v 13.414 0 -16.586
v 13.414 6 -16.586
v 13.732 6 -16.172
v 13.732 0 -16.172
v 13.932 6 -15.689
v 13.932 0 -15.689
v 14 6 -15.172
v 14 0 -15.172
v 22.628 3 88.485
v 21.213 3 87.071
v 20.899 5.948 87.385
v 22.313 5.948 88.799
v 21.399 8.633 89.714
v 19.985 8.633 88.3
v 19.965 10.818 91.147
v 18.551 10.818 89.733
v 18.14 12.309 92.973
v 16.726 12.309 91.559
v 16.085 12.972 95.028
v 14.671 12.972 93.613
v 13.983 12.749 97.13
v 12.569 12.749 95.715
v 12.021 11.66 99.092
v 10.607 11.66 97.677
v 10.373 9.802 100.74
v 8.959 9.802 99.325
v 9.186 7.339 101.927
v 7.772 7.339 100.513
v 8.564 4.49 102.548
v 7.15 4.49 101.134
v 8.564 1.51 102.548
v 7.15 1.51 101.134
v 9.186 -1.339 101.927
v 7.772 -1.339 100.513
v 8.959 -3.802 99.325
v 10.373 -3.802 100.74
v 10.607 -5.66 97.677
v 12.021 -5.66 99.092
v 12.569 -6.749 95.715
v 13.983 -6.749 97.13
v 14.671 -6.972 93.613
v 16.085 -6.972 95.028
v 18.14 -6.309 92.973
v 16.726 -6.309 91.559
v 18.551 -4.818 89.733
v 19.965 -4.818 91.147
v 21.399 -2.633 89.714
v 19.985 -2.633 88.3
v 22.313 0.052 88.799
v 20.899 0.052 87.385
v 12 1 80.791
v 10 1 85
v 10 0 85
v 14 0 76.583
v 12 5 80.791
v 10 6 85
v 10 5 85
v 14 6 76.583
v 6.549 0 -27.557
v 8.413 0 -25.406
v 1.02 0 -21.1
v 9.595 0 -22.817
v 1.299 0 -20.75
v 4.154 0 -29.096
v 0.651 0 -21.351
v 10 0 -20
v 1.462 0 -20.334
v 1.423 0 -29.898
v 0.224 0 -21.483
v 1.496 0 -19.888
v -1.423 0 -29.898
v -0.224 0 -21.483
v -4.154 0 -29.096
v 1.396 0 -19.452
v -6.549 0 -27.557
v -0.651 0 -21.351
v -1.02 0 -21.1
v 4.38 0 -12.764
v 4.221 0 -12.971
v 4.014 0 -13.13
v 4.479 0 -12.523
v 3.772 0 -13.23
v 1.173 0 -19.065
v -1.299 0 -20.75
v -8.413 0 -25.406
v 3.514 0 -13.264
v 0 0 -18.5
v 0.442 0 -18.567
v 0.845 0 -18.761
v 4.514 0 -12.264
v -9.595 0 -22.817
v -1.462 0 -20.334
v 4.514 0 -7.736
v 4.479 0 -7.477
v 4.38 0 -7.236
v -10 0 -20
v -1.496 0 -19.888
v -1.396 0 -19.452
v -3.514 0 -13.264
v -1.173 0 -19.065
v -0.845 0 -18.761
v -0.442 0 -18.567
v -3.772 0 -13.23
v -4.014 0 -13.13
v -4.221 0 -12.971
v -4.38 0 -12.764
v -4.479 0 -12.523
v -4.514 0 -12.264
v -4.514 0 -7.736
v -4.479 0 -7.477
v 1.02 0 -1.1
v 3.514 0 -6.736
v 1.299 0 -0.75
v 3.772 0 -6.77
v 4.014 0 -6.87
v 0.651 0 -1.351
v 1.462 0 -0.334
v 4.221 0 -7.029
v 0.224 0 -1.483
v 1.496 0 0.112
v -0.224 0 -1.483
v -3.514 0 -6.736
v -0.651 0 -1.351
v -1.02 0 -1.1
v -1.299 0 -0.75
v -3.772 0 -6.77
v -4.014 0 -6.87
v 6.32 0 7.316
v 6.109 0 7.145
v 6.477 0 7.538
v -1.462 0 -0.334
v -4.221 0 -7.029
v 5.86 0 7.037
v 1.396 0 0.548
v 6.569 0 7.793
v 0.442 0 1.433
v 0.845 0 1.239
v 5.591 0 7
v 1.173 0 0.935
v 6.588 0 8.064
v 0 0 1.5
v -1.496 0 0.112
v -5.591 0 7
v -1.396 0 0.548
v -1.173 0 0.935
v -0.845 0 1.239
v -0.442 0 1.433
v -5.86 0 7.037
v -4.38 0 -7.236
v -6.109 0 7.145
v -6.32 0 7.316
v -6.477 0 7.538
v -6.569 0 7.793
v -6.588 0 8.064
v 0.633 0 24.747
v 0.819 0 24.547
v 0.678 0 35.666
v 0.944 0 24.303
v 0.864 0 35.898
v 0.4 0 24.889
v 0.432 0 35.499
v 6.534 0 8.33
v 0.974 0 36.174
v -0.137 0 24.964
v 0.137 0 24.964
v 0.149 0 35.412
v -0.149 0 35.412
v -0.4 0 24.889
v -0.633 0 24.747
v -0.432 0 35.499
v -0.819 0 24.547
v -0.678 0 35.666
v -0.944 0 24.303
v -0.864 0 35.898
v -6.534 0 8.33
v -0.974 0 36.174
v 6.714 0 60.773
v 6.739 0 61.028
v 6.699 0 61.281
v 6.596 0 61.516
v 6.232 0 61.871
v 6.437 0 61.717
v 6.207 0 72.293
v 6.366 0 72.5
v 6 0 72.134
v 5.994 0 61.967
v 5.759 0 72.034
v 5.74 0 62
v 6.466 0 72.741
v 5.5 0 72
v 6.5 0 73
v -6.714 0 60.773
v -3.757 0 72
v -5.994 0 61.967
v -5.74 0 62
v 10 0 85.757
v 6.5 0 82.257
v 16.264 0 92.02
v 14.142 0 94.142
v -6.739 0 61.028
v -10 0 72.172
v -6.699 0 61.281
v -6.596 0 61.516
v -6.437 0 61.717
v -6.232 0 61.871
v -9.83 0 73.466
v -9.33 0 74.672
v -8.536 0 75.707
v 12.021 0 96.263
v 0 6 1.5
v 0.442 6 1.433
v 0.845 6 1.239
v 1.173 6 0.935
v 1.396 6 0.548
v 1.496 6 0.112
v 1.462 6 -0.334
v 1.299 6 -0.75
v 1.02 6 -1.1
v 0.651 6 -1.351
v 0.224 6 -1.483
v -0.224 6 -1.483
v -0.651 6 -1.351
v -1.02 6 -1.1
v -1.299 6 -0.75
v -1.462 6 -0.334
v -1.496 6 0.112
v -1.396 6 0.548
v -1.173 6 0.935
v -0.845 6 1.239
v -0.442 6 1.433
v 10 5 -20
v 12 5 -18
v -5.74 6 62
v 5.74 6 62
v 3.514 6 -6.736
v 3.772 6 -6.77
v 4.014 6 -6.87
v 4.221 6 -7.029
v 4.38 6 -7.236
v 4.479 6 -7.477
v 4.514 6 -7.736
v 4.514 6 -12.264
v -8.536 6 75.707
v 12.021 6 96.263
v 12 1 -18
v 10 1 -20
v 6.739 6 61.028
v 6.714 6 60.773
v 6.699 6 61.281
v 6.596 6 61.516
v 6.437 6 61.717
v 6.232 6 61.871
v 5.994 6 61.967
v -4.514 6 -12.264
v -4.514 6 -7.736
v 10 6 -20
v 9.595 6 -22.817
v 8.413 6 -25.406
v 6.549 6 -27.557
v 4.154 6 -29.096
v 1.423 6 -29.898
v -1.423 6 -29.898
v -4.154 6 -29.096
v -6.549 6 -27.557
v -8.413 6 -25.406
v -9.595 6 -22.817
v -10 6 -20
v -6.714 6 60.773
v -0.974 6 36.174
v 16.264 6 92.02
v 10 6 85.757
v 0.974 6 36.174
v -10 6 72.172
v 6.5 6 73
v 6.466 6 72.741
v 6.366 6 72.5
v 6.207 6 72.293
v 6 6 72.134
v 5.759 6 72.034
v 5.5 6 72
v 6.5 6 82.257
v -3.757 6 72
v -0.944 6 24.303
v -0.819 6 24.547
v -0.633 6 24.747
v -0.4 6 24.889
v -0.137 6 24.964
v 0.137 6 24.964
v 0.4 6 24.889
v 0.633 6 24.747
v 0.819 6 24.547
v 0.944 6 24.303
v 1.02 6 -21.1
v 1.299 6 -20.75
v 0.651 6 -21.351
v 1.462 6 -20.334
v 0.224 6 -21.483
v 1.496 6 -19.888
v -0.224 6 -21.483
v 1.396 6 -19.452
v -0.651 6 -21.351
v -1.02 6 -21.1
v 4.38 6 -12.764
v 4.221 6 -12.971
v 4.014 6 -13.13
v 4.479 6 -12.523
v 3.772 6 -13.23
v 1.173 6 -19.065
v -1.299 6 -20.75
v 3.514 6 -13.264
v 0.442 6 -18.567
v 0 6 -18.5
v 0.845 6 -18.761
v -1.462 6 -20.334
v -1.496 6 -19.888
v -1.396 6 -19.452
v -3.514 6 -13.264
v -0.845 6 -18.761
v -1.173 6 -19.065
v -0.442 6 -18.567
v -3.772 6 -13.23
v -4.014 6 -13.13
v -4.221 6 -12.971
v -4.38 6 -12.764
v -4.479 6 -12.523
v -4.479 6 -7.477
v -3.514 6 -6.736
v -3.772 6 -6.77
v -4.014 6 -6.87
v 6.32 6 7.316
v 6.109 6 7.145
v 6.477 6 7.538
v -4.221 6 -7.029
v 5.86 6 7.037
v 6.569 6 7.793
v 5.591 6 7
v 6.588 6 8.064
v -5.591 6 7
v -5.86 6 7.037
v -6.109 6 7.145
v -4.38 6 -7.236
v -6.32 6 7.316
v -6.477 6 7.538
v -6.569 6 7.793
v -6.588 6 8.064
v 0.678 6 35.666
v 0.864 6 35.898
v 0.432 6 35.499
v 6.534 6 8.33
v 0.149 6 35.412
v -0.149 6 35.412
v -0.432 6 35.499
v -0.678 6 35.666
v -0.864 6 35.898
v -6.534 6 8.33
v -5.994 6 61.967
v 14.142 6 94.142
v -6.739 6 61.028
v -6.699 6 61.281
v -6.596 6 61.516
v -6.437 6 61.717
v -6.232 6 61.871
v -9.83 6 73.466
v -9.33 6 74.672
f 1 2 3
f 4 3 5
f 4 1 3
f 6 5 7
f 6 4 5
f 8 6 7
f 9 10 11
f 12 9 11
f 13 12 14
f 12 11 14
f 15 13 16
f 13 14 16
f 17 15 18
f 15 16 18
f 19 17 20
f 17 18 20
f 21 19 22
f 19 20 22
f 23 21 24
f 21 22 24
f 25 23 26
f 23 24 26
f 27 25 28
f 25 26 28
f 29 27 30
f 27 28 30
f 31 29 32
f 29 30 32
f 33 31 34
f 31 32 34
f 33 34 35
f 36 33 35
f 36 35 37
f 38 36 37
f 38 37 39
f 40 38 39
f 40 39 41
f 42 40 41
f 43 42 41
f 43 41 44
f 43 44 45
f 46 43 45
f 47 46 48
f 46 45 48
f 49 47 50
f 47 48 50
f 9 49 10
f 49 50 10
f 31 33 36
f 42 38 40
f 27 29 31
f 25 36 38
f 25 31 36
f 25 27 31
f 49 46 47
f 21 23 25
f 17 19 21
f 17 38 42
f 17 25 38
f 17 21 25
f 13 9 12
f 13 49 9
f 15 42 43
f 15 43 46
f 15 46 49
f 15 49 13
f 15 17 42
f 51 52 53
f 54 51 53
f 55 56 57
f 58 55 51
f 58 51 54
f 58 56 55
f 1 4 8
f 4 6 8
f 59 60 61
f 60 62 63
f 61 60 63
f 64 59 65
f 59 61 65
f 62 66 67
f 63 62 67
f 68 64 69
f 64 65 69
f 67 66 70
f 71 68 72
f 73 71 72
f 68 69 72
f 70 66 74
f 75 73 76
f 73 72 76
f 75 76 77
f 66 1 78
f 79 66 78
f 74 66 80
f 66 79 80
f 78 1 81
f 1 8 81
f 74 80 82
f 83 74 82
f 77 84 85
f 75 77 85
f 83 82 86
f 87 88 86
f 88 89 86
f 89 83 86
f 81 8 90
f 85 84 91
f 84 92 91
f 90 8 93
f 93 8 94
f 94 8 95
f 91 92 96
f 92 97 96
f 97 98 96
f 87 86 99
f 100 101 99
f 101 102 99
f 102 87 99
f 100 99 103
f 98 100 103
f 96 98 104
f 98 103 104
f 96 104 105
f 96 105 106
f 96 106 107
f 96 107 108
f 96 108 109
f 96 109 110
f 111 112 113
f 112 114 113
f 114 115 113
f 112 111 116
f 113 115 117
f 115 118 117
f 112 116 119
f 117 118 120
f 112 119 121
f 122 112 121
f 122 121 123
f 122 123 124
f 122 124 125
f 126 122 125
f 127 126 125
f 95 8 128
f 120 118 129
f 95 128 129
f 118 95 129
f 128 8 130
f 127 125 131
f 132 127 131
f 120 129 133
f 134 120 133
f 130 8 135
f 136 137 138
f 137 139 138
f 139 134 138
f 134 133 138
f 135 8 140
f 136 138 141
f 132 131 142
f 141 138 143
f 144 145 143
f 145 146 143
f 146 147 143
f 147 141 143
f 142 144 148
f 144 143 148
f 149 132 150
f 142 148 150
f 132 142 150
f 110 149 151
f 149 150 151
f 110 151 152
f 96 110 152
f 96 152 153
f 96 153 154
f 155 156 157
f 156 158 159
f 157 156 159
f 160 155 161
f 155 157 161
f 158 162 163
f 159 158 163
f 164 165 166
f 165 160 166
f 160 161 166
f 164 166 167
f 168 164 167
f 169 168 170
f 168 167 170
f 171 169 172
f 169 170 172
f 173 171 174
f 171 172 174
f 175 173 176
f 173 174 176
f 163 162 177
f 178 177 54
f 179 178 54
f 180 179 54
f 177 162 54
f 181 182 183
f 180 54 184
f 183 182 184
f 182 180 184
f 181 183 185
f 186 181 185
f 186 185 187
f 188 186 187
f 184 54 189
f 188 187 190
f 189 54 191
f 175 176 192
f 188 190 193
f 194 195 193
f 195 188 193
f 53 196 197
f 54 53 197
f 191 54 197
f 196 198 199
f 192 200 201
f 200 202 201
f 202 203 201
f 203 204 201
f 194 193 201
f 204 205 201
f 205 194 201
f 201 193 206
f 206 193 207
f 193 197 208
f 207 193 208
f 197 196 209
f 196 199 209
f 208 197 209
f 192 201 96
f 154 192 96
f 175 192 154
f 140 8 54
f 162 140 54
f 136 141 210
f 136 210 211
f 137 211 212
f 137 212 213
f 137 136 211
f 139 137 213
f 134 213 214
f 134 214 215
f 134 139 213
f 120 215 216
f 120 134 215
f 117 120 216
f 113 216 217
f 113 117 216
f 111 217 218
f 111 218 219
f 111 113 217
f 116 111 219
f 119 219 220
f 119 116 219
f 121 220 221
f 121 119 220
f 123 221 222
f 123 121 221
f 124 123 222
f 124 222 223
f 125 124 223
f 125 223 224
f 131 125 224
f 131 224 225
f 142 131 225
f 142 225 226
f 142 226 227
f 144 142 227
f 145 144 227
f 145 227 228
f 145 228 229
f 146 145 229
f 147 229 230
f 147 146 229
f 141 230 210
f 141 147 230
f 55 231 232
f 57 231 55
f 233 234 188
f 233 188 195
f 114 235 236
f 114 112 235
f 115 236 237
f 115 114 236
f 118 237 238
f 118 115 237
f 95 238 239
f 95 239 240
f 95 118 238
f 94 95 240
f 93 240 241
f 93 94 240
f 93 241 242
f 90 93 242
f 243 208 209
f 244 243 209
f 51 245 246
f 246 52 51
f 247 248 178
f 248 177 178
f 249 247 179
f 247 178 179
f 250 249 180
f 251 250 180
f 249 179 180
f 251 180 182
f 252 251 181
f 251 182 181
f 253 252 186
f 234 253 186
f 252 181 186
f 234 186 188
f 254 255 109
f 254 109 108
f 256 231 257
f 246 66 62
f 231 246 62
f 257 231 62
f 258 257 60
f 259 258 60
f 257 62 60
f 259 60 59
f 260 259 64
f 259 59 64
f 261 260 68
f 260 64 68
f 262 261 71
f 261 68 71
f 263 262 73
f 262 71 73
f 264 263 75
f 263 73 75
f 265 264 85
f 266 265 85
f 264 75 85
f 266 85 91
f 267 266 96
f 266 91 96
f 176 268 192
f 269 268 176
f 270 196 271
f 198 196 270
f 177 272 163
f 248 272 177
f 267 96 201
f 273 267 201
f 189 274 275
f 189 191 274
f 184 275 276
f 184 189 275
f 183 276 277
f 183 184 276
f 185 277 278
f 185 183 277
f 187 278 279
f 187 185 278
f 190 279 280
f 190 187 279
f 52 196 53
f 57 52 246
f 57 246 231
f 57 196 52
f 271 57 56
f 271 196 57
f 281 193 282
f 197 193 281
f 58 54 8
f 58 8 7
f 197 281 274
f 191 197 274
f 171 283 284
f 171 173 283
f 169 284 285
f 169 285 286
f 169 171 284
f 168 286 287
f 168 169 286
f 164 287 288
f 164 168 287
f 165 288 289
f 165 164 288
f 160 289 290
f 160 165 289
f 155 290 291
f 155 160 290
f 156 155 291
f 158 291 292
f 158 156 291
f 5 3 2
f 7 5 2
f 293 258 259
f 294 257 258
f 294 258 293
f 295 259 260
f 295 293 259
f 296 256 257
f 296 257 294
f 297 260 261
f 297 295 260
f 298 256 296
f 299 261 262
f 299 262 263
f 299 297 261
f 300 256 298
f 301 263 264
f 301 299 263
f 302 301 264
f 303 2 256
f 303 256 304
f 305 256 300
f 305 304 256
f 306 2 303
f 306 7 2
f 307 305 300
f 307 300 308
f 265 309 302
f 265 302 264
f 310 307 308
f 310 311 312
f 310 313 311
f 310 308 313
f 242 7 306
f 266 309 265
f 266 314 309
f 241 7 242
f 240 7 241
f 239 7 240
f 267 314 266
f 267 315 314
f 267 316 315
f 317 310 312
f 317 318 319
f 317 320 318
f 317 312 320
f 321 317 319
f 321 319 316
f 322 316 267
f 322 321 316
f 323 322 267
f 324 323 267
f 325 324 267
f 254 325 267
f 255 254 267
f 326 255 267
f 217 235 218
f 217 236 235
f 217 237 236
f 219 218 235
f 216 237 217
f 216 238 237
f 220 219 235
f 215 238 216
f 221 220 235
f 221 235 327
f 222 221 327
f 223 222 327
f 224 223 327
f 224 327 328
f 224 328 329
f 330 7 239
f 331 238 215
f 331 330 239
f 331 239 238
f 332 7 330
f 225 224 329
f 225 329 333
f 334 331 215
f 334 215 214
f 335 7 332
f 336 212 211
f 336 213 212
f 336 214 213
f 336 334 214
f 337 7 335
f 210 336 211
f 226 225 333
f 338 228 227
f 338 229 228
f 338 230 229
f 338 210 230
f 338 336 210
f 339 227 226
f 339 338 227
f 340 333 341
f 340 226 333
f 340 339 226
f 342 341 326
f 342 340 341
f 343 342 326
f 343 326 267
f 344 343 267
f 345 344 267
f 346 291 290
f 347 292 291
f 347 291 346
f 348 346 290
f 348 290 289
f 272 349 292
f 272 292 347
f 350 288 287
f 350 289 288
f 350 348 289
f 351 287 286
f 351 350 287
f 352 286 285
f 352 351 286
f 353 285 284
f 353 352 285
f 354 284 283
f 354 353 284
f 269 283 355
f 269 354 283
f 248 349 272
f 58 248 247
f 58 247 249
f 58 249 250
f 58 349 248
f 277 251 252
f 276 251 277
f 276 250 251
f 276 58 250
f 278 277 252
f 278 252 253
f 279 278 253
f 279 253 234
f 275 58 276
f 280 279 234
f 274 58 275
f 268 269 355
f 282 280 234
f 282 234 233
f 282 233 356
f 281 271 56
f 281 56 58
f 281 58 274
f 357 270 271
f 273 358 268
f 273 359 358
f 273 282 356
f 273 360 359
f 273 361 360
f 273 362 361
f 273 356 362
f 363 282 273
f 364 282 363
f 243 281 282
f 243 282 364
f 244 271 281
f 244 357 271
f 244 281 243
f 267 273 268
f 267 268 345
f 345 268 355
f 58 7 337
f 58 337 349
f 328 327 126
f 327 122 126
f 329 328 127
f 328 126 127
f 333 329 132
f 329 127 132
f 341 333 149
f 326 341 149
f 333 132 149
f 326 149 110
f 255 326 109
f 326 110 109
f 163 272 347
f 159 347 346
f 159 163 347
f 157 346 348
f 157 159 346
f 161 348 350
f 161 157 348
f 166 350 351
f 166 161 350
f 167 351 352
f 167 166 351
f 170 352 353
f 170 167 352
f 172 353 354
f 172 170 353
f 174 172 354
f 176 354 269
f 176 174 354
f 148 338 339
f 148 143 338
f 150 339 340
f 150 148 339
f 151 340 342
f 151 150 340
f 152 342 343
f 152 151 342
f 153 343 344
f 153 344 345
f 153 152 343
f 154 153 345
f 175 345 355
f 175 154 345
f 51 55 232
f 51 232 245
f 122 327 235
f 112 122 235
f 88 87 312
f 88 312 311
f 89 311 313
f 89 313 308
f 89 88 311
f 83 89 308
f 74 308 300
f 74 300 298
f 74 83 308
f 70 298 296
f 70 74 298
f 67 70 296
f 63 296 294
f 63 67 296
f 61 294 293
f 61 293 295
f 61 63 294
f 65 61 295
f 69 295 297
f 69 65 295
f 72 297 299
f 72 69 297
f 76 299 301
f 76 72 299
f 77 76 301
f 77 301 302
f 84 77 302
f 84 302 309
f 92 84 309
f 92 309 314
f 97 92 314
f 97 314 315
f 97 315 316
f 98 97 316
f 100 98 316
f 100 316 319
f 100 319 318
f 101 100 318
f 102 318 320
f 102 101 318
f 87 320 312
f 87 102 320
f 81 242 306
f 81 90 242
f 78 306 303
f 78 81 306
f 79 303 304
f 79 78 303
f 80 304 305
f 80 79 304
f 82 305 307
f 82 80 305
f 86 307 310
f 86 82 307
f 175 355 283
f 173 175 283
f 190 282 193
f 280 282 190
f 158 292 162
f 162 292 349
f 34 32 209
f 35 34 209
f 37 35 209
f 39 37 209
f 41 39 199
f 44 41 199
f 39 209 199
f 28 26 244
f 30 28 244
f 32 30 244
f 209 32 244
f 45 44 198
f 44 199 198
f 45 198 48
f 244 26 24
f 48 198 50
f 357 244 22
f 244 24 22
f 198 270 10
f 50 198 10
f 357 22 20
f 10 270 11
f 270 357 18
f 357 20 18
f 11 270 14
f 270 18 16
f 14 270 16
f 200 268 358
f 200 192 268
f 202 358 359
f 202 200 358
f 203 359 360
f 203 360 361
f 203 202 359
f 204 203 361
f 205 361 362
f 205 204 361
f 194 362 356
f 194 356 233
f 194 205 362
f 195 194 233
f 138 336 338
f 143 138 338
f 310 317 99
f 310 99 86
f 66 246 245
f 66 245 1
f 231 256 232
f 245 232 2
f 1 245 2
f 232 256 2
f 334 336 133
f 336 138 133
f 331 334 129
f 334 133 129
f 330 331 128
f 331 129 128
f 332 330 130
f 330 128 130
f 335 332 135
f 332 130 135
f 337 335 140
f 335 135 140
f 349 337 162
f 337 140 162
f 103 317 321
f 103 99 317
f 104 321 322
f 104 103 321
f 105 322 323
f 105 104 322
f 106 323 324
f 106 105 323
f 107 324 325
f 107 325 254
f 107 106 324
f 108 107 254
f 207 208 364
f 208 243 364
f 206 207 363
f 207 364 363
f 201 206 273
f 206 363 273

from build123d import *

# Parameters (mm, degrees)
SKETCH1_R               = 1.5
BOSS_EXTRUDE1_DEPTH     = 6
SKETCH3_W               = 13
SKETCH3_H               = 23
SKETCH3_W_2             = 9.027129354
SKETCH3_H_2             = 6.528275522
CUT_EXTRUDE1_DEPTH      = 14
FILLET1_R               = 1
BOSS_EXTRUDE4_DEPTH     = 120
SKETCH7_W               = 4
SKETCH7_H               = 6
CUT_EXTRUDE5_DEPTH      = 15
SKETCH8_R               = 10
BOSS_EXTRUDE5_DEPTH     = 2
CUT_EXTRUDE6_DEPTH      = 18
FILLET4_R               = 2
FILLET5_R               = 5
CUT_EXTRUDE8_DEPTH      = 20
CUT_EXTRUDE8_DEPTH_BACK = 20
CUT_EXTRUDE9_DEPTH      = 20
CUT_EXTRUDE9_DEPTH_BACK = 20
BOSS_EXTRUDE9_DEPTH     = 6
SKETCH16_R              = 10
BOSS_EXTRUDE10_DEPTH    = 2
FILLET6_R               = 5


with BuildPart() as part:
    # Sketch1 → Boss-Extrude1 (new body)
    with BuildSketch(Plane(origin=(0, 0, 0), x_dir=(1, 0, 0), z_dir=(0, 1, 0))):
        with BuildLine():
            Line((-10, 20), (-10, -100))
            Line((-10, -100), (10, -100))
            Line((10, -100), (10, 20))
            ThreePointArc((10, 20), (0, 30), (-10, 20))
        make_face()
        with Locations(Location((0, 0, 0), (0, 0, 270))):
            Circle(SKETCH1_R, mode=Mode.SUBTRACT)
        with Locations(Location((0, 20, 0), (0, 0, 270))):
            Circle(SKETCH1_R, mode=Mode.SUBTRACT)
    extrude(amount=BOSS_EXTRUDE1_DEPTH)

    # Sketch3 → Cut-Extrude1 (cut)
    with BuildSketch(Plane(origin=(0, 6, 0), x_dir=(1, 0, 0), z_dir=(0, 1, 0))):
        Polygon((7, -7), (-7, -7), (0, -27), align=None)
        Polygon((7, -62), (-7, -62), (0, -32), align=None)
        with Locations((0, -83.5)):
            Rectangle(SKETCH3_W, SKETCH3_H)
        with Locations((0, 10)):
            Rectangle(SKETCH3_W_2, SKETCH3_H_2)
    extrude(amount=-CUT_EXTRUDE1_DEPTH, mode=Mode.SUBTRACT)

    # Fillet1
    fillet1_edges = [part.edges().sort_by_distance(p)[0] for p in [
        (-6.5, 3, 95),
        (-6.5, 3, 72),
        (6.5, 3, 72),
        (6.5, 3, 95),
        (0, 3, 32),
        (7, 3, 62),
        (-7, 3, 62),
        (-7, 3, 7),
        (7, 3, 7),
        (0, 3, 27),
        (-4.513564677, 3, -13.264137761),
        (4.513564677, 3, -13.264137761),
        (4.513564677, 3, -6.735862239),
        (-4.513564677, 3, -6.735862239),
    ]]
    fillet(fillet1_edges, radius=FILLET1_R)

    # Sketch6 → Boss-Extrude4 (add)
    with BuildSketch(Plane.XY.offset(100)):
        Polygon((14, 6), (10, 6), (10, 5), (12, 5), (12, 1), (10, 1), (10, 0), (14, 0), align=None)
    extrude(amount=-BOSS_EXTRUDE4_DEPTH)

    # Sketch7 → Cut-Extrude5 (cut)
    with BuildSketch(Plane.XY.offset(100)):
        with Locations((12, 3)):
            Rectangle(SKETCH7_W, SKETCH7_H)
    extrude(amount=-CUT_EXTRUDE5_DEPTH, mode=Mode.SUBTRACT)

    # Sketch8 → Boss-Extrude5 (add)
    with BuildSketch(Plane.XY.offset(100)):
        with Locations((0, 3)):
            Circle(SKETCH8_R)
    extrude(amount=BOSS_EXTRUDE5_DEPTH)

    # Sketch9 → Cut-Extrude6 (cut)
    with BuildSketch(Plane(origin=(0, 6, 0), x_dir=(1, 0, 0), z_dir=(0, 1, 0))):
        Polygon((10, 20), (14, 16), (14, 20), align=None)
        Polygon((10, -85), (14, -76.582524272), (14, -85), align=None)
    extrude(amount=-CUT_EXTRUDE6_DEPTH, mode=Mode.SUBTRACT)

    # Fillet4
    fillet4_edges = [part.edges().sort_by_distance(p)[0] for p in [
        (14, 3, -16),
    ]]
    fillet(fillet4_edges, radius=FILLET4_R)

    # Fillet5
    # the kernel refuses this fillet: 5 mm, written as the material it adds along each edge
    with BuildSketch(Plane(origin=(22.039392014, 6, 100), x_dir=(0, 0, -1), z_dir=(-1, 0, 0))) as fillet5_piece_1_section:
        with BuildLine():
            CenterArc((FILLET5_R, -FILLET5_R), FILLET5_R, 90, 90)
            Line((0, -FILLET5_R), (0, 0))
            Line((0, 0), (FILLET5_R, 0))
        make_face()
    fillet5_piece_1 = extrude(amount=44.078784028, mode=Mode.PRIVATE)
    fillet5_piece_1 = fillet5_piece_1 & Plane(origin=(0, 3, 98.854598336), x_dir=(1, 0, 0), z_dir=(0, 0, -1)) * Cylinder(10, 109, mode=Mode.PRIVATE)
    add(fillet5_piece_1)
    with BuildSketch(Plane(origin=(22.039392014, 0, 100), x_dir=(0, 0, -1), z_dir=(-1, 0, 0))) as fillet5_piece_2_section:
        with BuildLine():
            CenterArc((FILLET5_R, FILLET5_R), FILLET5_R, 180, 90)
            Line((0, FILLET5_R), (0, 0))
            Line((0, 0), (FILLET5_R, 0))
        make_face()
    fillet5_piece_2 = extrude(amount=44.078784028, mode=Mode.PRIVATE)
    fillet5_piece_2 = fillet5_piece_2 & Plane(origin=(0, 3, 98.854598336), x_dir=(1, 0, 0), z_dir=(0, 0, -1)) * Cylinder(10, 109, mode=Mode.PRIVATE)
    add(fillet5_piece_2)

    # Sketch13 → Cut-Extrude8 (cut, two sides: drawn at the far end of the back side and taken through both)
    with BuildSketch(Plane.XZ.offset(-CUT_EXTRUDE8_DEPTH_BACK)):
        with BuildLine():
            Line((-6.5, 73.5), (0, 80))
            Line((0, 80), (6.5, 86.5))
            Line((6.5, 86.5), (6.5, 94))
            ThreePointArc((6.5, 94), (6.207106781, 94.707106781), (5.5, 95))
            Line((5.5, 95), (9.539392014, 95))
            Line((9.539392014, 95), (9.539392014, 100))
            Line((9.539392014, 100), (10, 100))
            Line((10, 100), (10, 90))
            Line((10, 90), (14.142135624, 94.142135624))
            Line((14.142135624, 94.142135624), (18.212490394, 115.492902619))
            Line((18.212490394, 115.492902619), (-15.568958515, 115.492902619))
            Line((-15.568958515, 115.492902619), (-15.568958515, 64.431041485))
            Line((-15.568958515, 64.431041485), (-10, 70))
            Line((-10, 70), (-10, 100))
            Line((-10, 100), (-9.539392014, 100))
            Line((-9.539392014, 100), (-9.539392014, 95))
            Line((-9.539392014, 95), (-5.5, 95))
            ThreePointArc((-5.5, 95), (-6.207106781, 94.707106781), (-6.5, 94))
            Line((-6.5, 94), (-6.5, 73.5))
        make_face()
    extrude(amount=CUT_EXTRUDE8_DEPTH + CUT_EXTRUDE8_DEPTH_BACK, mode=Mode.SUBTRACT)

    # Sketch14 → Cut-Extrude9 (cut, two sides: drawn at the far end of the back side and taken through both)
    with BuildSketch(Plane.XZ.offset(-CUT_EXTRUDE9_DEPTH_BACK)):
        Polygon((0, 80), (19.360707344, 99.360707344), (19.360707344, 111.570074628), (-16.85715032, 110.200384013), (-16.85715032, 63.14284968), align=None)
    extrude(amount=CUT_EXTRUDE9_DEPTH + CUT_EXTRUDE9_DEPTH_BACK, mode=Mode.SUBTRACT)

    # Sketch15 → Boss-Extrude9 (add)
    with BuildSketch(Plane.XZ):
        Polygon((14.142135624, 94.142135624), (16.263884736, 92.020386512), (10, 85.756501776), (-10, 65.756501776), (-10, 74.242640687), (12.02081528, 96.263455967), align=None)
    extrude(amount=-BOSS_EXTRUDE9_DEPTH)

    # Sketch16 → Boss-Extrude10 (add)
    with BuildSketch(Plane(origin=(54.142135624, 0, 54.142135624), x_dir=(0.7071067811865469, 0, -0.7071067811865481), z_dir=(0.7071067811865481, 0, 0.7071067811865469))):
        with Locations((-56.56823931, 3)):
            Circle(SKETCH16_R)
    extrude(amount=BOSS_EXTRUDE10_DEPTH)

    # Fillet6
    fillet6_edges = [part.edges().sort_by_distance(p)[0] for p in [
        (-10, 3, 74.242640687),
    ]]
    fillet(fillet6_edges, radius=FILLET6_R)


solid = part.part
